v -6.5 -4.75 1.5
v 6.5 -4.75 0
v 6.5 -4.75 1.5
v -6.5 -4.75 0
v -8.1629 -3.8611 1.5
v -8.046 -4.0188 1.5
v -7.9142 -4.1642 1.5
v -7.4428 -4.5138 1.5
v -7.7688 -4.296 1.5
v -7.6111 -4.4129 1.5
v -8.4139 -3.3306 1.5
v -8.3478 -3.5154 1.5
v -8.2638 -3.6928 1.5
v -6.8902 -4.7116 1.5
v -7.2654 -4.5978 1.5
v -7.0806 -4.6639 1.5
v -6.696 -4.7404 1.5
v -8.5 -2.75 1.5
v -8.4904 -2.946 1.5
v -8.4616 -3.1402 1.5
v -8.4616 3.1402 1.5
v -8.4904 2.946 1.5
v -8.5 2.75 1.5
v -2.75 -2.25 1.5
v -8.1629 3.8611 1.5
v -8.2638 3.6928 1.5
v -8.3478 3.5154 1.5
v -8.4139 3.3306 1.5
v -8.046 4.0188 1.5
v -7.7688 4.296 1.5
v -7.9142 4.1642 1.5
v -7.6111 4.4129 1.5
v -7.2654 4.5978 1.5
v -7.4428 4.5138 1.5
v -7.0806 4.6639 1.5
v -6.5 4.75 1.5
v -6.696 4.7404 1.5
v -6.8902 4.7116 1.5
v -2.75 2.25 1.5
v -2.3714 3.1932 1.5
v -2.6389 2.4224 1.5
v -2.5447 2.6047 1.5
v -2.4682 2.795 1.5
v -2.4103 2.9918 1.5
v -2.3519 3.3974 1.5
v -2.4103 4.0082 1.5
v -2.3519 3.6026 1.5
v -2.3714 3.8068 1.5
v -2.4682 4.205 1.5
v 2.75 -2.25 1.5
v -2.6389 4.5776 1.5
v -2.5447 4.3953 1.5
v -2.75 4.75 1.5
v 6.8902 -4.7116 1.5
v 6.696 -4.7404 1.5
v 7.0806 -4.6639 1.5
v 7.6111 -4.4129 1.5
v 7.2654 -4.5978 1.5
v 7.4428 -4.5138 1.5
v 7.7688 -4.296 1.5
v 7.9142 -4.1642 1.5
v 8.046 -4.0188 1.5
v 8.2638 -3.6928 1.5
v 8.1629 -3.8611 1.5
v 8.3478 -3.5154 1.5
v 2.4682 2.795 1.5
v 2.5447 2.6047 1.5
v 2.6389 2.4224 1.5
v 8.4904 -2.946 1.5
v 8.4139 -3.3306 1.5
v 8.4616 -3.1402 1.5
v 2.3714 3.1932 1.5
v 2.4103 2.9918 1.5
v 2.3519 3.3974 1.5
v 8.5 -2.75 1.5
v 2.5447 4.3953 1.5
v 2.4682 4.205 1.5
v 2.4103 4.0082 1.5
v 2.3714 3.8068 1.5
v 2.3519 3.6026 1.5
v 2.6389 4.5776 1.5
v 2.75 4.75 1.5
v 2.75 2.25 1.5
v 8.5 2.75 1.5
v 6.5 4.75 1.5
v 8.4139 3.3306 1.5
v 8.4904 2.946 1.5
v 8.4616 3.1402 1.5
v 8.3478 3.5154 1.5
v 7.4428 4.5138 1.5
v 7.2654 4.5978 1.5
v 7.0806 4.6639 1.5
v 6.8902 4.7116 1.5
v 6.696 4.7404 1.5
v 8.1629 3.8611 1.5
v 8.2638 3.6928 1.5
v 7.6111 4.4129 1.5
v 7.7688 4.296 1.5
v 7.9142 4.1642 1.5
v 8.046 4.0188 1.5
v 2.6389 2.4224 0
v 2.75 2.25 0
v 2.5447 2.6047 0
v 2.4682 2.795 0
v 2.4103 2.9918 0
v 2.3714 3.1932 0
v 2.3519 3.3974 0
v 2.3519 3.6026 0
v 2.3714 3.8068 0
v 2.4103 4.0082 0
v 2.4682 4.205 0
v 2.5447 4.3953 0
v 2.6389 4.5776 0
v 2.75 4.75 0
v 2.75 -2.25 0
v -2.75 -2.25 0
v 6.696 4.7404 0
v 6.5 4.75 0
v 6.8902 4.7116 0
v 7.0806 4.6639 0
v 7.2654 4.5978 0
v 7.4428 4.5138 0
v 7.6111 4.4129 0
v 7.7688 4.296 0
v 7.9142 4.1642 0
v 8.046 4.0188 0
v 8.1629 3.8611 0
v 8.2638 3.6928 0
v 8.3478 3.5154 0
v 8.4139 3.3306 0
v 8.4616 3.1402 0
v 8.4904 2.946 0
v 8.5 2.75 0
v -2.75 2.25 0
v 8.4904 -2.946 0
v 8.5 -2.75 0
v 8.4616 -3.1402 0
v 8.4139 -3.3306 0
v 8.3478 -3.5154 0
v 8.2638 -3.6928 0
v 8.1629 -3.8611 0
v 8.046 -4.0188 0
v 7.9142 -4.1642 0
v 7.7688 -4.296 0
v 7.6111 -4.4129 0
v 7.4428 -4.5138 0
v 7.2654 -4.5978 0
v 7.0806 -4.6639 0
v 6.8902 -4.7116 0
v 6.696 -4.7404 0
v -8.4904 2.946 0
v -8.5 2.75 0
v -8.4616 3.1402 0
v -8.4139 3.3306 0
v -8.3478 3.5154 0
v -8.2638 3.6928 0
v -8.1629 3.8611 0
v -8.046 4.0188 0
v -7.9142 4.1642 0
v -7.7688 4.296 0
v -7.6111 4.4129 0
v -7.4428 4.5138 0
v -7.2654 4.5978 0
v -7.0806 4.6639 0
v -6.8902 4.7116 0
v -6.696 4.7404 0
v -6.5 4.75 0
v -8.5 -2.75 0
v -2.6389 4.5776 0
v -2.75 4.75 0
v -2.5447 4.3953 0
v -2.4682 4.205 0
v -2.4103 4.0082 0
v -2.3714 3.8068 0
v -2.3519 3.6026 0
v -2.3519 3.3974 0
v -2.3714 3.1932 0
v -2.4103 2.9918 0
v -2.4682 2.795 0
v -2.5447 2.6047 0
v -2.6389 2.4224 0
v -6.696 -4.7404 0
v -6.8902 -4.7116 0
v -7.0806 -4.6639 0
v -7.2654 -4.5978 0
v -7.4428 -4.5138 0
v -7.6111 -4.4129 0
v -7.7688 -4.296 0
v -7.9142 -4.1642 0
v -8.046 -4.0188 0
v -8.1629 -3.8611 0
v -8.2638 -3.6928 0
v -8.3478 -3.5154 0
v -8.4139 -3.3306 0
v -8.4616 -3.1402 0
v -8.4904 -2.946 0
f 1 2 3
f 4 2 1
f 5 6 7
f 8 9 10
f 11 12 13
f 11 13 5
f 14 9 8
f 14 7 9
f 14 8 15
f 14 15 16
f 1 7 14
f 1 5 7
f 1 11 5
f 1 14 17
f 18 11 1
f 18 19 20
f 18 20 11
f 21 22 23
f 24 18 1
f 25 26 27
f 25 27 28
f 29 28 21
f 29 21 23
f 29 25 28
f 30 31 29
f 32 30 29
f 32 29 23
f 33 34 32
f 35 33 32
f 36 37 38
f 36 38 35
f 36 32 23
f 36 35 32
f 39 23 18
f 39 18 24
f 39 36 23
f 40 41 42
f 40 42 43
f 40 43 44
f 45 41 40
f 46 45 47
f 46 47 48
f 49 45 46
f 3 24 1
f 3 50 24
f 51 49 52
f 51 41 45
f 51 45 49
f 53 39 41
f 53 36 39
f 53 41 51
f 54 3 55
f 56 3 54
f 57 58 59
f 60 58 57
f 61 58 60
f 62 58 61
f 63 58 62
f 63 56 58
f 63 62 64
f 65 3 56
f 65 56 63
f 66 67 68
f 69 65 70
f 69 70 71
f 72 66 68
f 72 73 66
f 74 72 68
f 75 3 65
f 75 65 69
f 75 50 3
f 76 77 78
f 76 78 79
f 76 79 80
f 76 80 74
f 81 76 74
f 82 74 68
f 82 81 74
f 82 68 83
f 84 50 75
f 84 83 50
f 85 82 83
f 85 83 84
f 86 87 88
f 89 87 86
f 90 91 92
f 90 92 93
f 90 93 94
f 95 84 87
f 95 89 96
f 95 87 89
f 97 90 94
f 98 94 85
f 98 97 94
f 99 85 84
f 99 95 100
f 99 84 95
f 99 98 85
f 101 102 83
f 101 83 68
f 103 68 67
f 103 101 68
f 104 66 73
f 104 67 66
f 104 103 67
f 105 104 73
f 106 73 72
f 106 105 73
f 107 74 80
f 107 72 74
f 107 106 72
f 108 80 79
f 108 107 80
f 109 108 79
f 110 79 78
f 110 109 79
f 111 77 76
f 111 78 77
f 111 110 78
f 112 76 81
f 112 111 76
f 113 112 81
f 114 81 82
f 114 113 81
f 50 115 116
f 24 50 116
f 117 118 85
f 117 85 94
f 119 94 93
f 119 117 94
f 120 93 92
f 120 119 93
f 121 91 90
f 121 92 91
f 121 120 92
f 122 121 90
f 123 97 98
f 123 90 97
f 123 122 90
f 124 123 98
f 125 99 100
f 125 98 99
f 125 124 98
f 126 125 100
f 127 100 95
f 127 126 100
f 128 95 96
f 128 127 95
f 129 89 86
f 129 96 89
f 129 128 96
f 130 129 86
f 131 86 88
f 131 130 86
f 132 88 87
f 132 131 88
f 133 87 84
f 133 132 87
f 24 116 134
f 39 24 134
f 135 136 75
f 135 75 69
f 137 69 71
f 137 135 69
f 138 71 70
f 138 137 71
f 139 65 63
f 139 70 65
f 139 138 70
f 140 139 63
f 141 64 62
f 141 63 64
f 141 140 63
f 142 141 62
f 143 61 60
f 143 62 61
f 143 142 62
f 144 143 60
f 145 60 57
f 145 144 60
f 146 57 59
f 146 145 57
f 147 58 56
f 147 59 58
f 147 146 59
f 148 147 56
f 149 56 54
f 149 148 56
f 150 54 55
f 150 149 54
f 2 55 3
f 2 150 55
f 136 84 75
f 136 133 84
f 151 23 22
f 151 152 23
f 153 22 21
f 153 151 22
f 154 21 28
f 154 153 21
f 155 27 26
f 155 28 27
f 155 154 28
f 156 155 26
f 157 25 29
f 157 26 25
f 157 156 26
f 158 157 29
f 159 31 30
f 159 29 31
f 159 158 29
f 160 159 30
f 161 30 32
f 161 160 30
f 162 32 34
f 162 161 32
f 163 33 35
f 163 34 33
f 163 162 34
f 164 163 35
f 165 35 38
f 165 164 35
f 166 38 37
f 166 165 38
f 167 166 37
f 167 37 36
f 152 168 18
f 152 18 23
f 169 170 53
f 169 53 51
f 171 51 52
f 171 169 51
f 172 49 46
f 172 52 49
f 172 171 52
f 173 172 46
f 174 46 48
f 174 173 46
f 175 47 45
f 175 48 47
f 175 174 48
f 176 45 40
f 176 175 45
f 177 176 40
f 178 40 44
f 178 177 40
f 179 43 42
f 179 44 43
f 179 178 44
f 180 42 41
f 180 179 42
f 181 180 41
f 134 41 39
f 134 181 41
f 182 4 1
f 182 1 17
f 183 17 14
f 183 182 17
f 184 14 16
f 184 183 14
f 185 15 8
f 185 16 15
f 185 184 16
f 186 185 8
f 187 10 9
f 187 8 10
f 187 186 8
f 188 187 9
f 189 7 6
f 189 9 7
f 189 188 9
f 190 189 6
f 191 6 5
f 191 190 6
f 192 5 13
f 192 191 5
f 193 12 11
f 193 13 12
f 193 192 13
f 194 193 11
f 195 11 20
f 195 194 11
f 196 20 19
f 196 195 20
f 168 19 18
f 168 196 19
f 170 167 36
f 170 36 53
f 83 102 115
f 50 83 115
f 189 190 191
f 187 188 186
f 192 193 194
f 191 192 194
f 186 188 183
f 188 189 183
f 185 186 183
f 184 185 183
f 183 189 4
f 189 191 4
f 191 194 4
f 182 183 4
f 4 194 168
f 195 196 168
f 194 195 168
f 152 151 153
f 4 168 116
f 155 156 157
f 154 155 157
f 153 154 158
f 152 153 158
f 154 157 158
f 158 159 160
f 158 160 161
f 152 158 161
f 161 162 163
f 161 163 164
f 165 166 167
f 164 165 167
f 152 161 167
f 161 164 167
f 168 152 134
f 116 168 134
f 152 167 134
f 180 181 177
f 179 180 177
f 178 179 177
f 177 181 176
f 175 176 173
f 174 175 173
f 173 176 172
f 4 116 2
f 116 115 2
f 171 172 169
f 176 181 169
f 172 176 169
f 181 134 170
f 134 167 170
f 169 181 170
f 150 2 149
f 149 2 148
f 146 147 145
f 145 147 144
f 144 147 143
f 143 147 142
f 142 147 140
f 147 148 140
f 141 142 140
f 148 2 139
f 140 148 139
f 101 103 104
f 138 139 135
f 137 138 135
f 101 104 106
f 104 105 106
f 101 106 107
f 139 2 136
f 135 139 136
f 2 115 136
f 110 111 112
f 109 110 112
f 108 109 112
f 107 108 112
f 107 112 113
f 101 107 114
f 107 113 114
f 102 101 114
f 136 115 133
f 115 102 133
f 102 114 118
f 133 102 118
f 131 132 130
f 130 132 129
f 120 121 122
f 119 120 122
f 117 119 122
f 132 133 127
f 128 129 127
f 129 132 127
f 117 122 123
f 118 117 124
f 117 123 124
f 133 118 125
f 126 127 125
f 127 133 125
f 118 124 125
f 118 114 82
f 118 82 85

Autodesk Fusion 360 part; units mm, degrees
sketch "Skizze1" plane through (0, 0, 0) normal (0, 0, 1) x (1, 0, 0)
  line L0 (6.5, -4.75) -> (-6.5, -4.75)
  line L1 (-8.5, -2.75) -> (-8.5, 2.75)
  line L2 (-6.5, 4.75) -> (6.5, 4.75)
  line L3 (8.5, 2.75) -> (8.5, -2.75)
  line L4 (8.5, -4.75) -> (-8.5, 4.75) construction
  line L5 (-8.5, -4.75) -> (8.5, 4.75) construction
  arc A0 (-6.5, 4.75) -> (-8.5, 2.75) centre (-6.5, 2.75) ccw
  arc A1 (8.5, 2.75) -> (6.5, 4.75) centre (6.5, 2.75) ccw
  arc A2 (6.5, -4.75) -> (8.5, -2.75) centre (6.5, -2.75) ccw
  arc A3 (-8.5, -2.75) -> (-6.5, -4.75) centre (-6.5, -2.75) ccw
  line L6 (2.75, -2.25) -> (-2.75, -2.25)
  line L7 (-2.75, -2.25) -> (-2.75, 2.25)
  line L8 (-2.75, 2.25) -> (2.75, 2.25)
  line L9 (2.75, 2.25) -> (2.75, -2.25)
  line L10 (2.75, -2.25) -> (-2.75, 2.25) construction
  line L11 (-2.75, -2.25) -> (2.75, 2.25) construction
  line L12 (-2.75, 2.25) -> (-2.75, 4.75)
  line L13 (2.75, 2.25) -> (2.75, 4.75)
  arc A4 (-2.75, 2.25) -> (-2.75, 4.75) centre (-4.5, 3.5) ccw
  arc A5 (2.75, 4.75) -> (2.75, 2.25) centre (4.5, 3.5) ccw
  dimension "d487" = 17
  dimension "d488" = 9.5
  dimension "d489" = 2
  dimension "d491" = 5.5
  dimension "d492" = 4.5
  dimension "d501" = 9
extrude "Extrusion1" add sketch "Skizze1" along normal blind 1.5 contours L0 L1 L2 L3 A0 A1 A2 A3 L6 L7 L9 L12 L13 | L13 A5 | L12 A4
